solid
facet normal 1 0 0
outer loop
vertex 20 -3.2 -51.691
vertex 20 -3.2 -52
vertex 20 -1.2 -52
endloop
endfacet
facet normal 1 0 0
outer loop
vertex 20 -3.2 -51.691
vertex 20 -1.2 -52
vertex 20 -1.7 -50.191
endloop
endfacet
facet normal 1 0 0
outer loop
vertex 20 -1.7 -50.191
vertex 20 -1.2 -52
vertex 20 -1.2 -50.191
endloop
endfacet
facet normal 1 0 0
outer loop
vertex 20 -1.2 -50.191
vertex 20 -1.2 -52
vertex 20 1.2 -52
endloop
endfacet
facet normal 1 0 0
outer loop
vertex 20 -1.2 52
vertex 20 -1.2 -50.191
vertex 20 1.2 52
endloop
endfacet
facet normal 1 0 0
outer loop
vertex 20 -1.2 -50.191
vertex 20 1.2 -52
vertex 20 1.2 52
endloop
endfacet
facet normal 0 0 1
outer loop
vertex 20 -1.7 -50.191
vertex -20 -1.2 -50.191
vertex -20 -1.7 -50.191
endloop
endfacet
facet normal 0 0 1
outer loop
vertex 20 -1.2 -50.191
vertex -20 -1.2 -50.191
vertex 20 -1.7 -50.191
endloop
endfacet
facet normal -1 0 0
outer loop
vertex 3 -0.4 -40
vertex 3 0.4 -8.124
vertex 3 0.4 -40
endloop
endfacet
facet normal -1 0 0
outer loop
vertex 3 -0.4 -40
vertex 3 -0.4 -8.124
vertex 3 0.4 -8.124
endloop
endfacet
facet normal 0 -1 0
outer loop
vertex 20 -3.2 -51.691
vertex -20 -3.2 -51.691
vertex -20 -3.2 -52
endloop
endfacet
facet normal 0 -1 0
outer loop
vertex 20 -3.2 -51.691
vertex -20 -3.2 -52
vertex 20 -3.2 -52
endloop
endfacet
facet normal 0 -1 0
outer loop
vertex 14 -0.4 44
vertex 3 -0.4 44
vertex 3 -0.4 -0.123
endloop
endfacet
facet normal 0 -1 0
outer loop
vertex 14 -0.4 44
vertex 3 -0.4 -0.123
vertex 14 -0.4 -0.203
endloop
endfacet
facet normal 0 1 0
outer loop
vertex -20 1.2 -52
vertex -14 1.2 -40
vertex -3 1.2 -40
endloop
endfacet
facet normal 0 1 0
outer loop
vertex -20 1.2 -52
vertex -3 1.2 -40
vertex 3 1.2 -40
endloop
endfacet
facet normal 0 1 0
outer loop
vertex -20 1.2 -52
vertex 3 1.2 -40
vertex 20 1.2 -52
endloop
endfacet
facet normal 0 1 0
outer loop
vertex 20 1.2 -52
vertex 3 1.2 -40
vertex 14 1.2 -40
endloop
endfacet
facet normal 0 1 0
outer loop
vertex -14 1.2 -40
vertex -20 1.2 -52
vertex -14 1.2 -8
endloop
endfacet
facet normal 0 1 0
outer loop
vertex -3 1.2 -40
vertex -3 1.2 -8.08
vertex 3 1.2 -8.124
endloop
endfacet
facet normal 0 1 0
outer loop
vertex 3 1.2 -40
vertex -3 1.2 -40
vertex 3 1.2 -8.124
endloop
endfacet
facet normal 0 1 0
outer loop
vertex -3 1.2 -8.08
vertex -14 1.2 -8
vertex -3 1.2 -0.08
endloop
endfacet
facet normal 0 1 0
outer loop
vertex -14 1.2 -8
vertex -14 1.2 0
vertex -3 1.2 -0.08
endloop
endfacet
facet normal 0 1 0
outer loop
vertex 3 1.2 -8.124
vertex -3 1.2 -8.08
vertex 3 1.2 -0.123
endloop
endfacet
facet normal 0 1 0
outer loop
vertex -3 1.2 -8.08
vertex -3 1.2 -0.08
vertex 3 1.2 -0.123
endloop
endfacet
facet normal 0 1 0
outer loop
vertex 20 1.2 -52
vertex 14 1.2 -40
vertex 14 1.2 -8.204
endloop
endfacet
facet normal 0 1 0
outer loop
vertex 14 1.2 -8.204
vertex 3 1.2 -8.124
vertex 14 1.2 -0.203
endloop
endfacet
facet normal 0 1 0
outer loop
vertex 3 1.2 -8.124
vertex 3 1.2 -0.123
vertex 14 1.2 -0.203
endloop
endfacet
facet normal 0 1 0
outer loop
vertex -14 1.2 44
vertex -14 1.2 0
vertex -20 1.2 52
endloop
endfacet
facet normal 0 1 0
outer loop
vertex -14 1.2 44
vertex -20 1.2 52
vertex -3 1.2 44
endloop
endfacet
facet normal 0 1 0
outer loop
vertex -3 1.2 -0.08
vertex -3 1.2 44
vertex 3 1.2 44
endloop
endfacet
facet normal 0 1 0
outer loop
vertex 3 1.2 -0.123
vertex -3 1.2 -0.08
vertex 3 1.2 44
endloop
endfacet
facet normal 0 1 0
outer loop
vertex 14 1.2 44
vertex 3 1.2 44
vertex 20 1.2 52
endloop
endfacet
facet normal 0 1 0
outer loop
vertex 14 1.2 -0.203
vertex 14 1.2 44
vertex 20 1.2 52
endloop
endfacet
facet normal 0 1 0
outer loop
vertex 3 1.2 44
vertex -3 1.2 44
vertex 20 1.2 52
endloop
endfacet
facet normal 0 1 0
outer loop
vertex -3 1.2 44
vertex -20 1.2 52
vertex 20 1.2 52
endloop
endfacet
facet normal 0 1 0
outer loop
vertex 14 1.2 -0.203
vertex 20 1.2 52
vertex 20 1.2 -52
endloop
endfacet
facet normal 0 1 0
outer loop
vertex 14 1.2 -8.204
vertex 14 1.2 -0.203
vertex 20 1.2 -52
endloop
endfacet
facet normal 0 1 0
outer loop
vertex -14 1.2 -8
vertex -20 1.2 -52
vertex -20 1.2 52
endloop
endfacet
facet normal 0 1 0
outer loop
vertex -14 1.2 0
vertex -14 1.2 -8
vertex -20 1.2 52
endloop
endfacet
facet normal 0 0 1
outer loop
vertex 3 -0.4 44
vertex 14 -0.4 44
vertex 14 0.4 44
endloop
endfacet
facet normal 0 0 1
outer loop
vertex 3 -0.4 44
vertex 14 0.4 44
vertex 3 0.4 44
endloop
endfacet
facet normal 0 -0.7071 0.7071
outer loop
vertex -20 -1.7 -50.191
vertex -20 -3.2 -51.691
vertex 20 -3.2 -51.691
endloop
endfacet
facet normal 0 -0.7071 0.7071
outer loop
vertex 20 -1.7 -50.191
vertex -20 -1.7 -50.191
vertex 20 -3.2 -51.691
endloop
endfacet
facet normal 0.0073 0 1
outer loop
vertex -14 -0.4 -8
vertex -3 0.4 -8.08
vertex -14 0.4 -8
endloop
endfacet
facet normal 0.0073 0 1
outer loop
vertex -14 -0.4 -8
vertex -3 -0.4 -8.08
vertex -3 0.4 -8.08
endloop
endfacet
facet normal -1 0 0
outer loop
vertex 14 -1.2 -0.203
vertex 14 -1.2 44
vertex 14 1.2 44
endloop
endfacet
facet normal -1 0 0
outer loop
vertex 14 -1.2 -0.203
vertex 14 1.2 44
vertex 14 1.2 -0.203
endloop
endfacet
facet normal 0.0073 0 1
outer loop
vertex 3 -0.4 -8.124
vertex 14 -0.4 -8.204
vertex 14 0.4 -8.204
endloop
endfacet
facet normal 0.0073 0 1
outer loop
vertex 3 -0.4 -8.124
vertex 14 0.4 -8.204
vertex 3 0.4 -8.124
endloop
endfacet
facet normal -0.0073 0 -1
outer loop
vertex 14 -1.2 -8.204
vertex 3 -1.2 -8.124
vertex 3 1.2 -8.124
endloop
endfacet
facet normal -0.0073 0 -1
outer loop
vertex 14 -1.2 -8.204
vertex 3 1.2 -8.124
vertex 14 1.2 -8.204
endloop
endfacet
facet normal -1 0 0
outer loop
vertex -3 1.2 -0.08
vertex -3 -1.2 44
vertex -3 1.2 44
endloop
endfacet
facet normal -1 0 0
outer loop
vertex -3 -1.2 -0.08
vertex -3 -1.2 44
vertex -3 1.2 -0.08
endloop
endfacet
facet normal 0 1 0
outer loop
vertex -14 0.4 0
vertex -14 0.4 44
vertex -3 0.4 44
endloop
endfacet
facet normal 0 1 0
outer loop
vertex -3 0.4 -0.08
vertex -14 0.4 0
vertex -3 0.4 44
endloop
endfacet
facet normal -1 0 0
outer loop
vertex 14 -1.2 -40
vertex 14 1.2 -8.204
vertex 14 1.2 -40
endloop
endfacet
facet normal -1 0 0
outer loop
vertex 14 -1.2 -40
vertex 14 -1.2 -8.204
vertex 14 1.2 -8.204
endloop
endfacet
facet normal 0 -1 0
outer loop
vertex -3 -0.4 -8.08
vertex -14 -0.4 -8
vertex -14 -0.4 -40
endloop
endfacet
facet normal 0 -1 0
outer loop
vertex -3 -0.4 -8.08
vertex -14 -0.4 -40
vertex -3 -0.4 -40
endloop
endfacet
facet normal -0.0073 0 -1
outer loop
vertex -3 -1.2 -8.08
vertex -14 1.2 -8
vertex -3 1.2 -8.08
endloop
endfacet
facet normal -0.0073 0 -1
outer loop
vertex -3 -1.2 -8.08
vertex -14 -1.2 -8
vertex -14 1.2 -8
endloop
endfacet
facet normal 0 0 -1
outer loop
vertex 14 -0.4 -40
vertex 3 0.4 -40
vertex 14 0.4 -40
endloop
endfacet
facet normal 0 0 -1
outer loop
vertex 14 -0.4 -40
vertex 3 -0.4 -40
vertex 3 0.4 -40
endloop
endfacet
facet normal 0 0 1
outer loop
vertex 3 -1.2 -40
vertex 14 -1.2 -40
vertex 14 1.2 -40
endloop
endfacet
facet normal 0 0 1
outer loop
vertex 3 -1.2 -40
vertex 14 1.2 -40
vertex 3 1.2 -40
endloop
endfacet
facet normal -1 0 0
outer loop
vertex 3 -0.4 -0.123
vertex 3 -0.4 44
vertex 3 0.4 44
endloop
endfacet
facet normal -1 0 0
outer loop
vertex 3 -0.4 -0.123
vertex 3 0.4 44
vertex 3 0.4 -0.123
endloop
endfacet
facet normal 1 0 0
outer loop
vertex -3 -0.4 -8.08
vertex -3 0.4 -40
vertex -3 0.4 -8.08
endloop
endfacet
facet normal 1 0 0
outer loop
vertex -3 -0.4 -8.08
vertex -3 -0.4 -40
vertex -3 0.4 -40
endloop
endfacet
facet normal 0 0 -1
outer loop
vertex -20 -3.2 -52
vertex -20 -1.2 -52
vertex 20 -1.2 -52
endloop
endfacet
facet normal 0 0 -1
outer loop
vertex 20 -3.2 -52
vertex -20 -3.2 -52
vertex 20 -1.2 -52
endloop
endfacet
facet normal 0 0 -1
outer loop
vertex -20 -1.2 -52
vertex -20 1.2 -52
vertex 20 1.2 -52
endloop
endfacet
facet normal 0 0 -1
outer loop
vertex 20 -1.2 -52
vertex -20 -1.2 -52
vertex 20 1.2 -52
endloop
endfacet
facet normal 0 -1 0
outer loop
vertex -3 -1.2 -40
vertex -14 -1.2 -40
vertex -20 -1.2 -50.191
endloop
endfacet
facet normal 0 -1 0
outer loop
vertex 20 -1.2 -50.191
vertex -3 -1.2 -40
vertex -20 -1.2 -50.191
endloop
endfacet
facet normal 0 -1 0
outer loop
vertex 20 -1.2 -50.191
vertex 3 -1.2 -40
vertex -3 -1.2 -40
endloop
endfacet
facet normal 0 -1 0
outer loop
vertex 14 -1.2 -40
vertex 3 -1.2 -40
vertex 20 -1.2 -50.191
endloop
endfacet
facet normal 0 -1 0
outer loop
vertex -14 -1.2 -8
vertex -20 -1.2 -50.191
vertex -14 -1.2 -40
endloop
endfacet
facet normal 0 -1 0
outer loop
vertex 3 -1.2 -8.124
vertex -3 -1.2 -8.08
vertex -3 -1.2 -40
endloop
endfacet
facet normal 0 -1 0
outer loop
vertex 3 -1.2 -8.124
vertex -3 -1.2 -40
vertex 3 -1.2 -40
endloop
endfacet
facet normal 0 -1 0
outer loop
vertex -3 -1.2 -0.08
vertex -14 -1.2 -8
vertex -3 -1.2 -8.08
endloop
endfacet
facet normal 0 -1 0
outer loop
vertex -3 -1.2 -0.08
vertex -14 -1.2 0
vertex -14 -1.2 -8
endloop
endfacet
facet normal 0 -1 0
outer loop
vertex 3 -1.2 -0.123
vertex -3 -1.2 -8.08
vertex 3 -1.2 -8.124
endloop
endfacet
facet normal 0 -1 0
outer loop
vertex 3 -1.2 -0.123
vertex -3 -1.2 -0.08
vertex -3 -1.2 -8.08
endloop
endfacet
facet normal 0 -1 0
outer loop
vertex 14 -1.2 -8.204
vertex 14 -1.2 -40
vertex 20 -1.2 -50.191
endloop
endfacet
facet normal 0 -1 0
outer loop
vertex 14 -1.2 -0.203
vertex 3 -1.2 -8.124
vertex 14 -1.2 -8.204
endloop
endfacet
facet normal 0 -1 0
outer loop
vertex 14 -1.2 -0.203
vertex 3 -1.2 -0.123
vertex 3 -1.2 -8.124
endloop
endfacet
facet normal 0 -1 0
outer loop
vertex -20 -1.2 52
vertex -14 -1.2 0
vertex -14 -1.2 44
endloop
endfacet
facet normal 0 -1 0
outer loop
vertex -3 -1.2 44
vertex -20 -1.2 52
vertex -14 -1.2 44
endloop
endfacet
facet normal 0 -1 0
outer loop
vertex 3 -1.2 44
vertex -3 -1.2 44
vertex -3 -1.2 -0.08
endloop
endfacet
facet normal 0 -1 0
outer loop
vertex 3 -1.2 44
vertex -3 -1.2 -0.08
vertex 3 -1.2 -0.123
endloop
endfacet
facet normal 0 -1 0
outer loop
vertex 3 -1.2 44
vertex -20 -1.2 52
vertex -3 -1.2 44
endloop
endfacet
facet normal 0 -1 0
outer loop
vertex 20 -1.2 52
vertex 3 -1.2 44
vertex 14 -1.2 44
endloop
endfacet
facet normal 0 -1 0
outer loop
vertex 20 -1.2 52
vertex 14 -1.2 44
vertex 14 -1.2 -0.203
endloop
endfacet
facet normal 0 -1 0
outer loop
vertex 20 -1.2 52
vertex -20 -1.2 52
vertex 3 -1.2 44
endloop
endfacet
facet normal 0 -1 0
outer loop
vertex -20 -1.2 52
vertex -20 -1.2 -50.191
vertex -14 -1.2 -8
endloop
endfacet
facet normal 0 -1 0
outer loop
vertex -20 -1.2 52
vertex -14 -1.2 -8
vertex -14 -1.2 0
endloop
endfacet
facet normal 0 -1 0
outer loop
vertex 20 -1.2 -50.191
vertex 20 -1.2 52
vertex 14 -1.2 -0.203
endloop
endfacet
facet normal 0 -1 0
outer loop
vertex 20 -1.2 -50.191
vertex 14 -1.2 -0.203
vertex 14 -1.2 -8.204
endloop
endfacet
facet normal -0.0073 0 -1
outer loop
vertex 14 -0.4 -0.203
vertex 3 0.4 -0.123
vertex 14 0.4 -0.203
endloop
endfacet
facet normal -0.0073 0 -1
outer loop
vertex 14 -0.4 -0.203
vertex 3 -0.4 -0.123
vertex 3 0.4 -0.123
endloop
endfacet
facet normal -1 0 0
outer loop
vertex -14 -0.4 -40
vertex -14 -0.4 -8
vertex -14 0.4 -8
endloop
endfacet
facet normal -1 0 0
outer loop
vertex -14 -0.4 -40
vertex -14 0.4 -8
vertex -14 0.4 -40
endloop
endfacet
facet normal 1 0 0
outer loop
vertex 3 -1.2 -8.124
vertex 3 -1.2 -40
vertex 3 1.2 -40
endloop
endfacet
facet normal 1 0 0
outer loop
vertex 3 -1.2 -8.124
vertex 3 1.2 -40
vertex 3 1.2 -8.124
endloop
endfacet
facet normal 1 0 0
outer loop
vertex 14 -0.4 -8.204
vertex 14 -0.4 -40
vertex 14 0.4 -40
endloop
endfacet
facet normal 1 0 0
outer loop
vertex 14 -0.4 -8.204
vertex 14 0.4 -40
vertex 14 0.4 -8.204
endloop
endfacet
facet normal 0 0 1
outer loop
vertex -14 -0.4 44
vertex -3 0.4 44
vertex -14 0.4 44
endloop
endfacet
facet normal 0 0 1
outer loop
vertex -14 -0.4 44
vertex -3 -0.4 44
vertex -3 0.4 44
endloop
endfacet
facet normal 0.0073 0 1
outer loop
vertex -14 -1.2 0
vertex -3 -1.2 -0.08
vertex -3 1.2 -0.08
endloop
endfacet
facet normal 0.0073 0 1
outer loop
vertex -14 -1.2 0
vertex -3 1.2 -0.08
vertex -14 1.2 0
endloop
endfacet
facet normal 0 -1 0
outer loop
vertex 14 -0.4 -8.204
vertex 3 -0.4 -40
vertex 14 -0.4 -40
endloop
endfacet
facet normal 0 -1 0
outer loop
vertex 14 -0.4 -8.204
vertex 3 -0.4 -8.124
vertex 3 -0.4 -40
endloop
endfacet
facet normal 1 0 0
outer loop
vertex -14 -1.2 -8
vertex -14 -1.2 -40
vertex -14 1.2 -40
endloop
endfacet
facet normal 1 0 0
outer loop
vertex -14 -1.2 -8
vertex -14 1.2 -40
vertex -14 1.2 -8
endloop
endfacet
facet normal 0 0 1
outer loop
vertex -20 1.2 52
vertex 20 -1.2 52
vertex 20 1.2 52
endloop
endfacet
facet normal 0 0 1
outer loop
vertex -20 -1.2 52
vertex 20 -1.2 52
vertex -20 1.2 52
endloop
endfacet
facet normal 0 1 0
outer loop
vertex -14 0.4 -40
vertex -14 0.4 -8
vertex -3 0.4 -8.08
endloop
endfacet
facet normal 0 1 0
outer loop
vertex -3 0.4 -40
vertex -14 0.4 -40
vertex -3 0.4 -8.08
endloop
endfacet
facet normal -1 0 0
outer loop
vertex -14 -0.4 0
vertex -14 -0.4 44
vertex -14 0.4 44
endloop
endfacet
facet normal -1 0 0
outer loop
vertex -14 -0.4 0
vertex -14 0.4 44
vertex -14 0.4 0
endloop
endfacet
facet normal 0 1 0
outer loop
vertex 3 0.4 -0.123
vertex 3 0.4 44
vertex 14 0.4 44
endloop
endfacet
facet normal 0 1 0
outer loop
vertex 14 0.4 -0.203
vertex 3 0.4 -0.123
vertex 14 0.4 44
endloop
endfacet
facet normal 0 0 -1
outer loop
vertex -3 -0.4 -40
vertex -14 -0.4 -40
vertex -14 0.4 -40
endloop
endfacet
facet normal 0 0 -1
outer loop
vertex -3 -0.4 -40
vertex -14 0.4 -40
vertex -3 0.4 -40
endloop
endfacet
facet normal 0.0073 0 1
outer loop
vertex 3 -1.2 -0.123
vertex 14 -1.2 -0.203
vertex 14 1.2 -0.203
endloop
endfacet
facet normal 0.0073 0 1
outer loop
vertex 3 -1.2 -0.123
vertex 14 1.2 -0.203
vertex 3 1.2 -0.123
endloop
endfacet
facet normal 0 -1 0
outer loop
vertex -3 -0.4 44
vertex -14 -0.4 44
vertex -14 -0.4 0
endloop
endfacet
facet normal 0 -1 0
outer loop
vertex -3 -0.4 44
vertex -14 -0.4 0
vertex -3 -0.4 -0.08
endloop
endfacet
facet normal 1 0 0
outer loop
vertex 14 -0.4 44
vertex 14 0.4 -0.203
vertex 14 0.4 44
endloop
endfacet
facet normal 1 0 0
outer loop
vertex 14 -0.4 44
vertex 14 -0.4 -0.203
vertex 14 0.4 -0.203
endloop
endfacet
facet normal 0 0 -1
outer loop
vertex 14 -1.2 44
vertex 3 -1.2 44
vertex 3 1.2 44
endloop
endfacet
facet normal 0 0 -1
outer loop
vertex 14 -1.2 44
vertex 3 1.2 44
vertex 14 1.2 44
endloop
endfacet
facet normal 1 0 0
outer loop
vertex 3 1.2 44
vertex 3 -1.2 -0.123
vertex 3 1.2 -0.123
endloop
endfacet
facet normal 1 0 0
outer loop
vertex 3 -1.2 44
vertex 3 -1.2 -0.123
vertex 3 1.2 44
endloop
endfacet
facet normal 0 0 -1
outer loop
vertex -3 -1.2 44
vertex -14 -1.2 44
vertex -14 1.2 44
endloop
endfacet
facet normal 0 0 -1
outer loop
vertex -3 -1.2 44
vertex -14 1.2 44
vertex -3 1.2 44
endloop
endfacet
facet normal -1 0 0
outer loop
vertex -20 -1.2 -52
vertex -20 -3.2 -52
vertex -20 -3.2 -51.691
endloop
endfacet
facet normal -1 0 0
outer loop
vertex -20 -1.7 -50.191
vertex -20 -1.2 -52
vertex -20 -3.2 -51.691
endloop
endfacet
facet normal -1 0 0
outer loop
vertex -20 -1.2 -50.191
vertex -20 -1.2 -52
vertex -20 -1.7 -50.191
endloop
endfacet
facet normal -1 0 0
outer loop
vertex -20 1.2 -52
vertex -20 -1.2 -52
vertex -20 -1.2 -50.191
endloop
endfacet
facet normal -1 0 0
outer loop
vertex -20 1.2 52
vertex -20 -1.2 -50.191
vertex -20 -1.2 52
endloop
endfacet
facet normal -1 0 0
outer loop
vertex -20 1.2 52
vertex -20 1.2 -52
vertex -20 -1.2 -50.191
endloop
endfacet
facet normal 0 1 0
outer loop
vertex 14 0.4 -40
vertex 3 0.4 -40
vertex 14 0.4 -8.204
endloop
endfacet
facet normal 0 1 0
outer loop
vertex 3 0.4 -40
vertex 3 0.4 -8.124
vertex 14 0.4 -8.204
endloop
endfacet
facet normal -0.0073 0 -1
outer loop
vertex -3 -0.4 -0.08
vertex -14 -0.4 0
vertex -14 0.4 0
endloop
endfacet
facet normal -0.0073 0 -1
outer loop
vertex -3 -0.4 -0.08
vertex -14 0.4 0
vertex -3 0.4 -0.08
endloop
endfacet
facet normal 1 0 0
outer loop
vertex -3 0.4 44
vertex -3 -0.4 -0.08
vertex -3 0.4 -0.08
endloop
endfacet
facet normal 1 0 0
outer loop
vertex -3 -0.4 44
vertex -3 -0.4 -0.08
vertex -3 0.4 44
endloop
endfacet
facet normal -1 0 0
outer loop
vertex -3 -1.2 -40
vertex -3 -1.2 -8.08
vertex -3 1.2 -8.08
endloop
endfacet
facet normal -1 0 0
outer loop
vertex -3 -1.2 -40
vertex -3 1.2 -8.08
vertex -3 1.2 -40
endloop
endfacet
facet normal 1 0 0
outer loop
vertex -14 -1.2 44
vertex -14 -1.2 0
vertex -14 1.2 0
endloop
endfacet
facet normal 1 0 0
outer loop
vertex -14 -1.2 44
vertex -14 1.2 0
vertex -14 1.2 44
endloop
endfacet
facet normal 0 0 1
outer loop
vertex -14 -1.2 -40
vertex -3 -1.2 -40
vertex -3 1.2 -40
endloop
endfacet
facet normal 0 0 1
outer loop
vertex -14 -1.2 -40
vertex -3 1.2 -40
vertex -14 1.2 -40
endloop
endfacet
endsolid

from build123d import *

# Parameters (mm, degrees)
F1_DEPTH      = 0.4
F1_DEPTH_BACK = 0.4
F0_W          = 6
F0_H          = 8
F0_H_2        = 12
F2_DEPTH      = 1.2
F2_DEPTH_BACK = 1.2
F3_W          = 40
F3_H          = 1.8093388975
F4_DEPTH      = 2
F5_SIZE       = 1.5


# Not quite as in the source:
# - ends of sketch curves that miss each other by under 0.0002 mm in the source are joined


with BuildPart() as f1:
    # F0 (on Front) → F1 (new body, two sides)
    with BuildSketch(Plane.XZ) as f1_sk:
        Polygon((-3, 44), (-14, 44), (-14, 0), (-3, -0.0798979561), align=None)
    extrude(amount=F1_DEPTH)
    extrude(f1_sk.sketch, amount=-F1_DEPTH_BACK)


with BuildPart() as f1b:
    # F0 (on Front) → F1, piece 2 (new body, two sides)
    with BuildSketch(Plane.XZ) as f1_2_sk:
        Polygon((14, -0.2033766155), (14, 44), (3, 44), (3, -0.1234786594), align=None)
    extrude(amount=F1_DEPTH)
    extrude(f1_2_sk.sketch, amount=-F1_DEPTH_BACK)


with BuildPart() as f1c:
    # F0 (on Front) → F1, piece 3 (new body, two sides)
    with BuildSketch(Plane.XZ) as f1_3_sk:
        Polygon((-3, -8.0801089842), (-14.0000014294, -8.0002110177), (-14, -40), (-3, -40), align=None)
    extrude(amount=F1_DEPTH)
    extrude(f1_3_sk.sketch, amount=-F1_DEPTH_BACK)


with BuildPart() as f1d:
    # F0 (on Front) → F1, piece 4 (new body, two sides)
    with BuildSketch(Plane.XZ) as f1_4_sk:
        Polygon((3, -40), (14, -40), (14, -8.2035876436), (3, -8.1236896875), align=None)
    extrude(amount=F1_DEPTH)
    extrude(f1_4_sk.sketch, amount=-F1_DEPTH_BACK)


with BuildPart() as f2:
    # F0 (on Front) → F2 (new body, two sides)
    with BuildSketch(Plane.XZ) as f2_sk:
        with Locations((-17, 48)):
            Rectangle(F0_W, F0_H)
        Polygon((14, 44), (14, 52), (-14, 52), (-14, 44), (-3, 44), (3, 44), align=None)
        with Locations((17, 48)):
            Rectangle(F0_W, F0_H)
        Polygon((20, -40), (20, 44), (14, 44), (14, -0.2033766155), (14, -8.2035876436), (14, -40), align=None)
        Polygon((3, -0.1234786594), (3, 44), (-3, 44), (-3, -0.0798979561), align=None)
        Polygon((-14, 0), (-14, 44), (-20, 44), (-20, -40), (-14, -40), (-14, -8.0002110177), align=None)
        Polygon((-3, -0.0798979561), (-14, 0), (-14, -8.0002110177), (-3, -8.0801089842), align=None)
        Polygon((3, -8.1236896875), (3, -0.1234786594), (-3, -0.0798979561), (-3, -8.0801089842), align=None)
        Polygon((14, -8.2035876436), (14, -0.2033766155), (3, -0.1234786594), (3, -8.1236896875), align=None)
        Polygon((-3, -40), (3, -40), (3, -8.1236896875), (-3, -8.0801089842), align=None)
        with Locations((-17, -46)):
            Rectangle(F0_W, F0_H_2)
        Polygon((14, -52), (14, -40), (3, -40), (-3, -40), (-14, -40), (-14, -52), align=None)
        with Locations((17, -46)):
            Rectangle(F0_W, F0_H_2)
    extrude(amount=F2_DEPTH)
    extrude(f2_sk.sketch, amount=-F2_DEPTH_BACK)

    # F3 (on face) → F4 (join)
    with BuildSketch(Plane.XZ.offset(1.2)):
        with Locations((0, -51.0953305513)):
            Rectangle(F3_W, F3_H)
    extrude(amount=F4_DEPTH)

    # F5
    f5_edges = [f2.edges().sort_by_distance(p)[0] for p in [
        (0, -3.2, -50.190661),
    ]]
    chamfer(f5_edges, length=F5_SIZE)


solid = Compound([f1.part, f1b.part, f1c.part, f1d.part, f2.part])
